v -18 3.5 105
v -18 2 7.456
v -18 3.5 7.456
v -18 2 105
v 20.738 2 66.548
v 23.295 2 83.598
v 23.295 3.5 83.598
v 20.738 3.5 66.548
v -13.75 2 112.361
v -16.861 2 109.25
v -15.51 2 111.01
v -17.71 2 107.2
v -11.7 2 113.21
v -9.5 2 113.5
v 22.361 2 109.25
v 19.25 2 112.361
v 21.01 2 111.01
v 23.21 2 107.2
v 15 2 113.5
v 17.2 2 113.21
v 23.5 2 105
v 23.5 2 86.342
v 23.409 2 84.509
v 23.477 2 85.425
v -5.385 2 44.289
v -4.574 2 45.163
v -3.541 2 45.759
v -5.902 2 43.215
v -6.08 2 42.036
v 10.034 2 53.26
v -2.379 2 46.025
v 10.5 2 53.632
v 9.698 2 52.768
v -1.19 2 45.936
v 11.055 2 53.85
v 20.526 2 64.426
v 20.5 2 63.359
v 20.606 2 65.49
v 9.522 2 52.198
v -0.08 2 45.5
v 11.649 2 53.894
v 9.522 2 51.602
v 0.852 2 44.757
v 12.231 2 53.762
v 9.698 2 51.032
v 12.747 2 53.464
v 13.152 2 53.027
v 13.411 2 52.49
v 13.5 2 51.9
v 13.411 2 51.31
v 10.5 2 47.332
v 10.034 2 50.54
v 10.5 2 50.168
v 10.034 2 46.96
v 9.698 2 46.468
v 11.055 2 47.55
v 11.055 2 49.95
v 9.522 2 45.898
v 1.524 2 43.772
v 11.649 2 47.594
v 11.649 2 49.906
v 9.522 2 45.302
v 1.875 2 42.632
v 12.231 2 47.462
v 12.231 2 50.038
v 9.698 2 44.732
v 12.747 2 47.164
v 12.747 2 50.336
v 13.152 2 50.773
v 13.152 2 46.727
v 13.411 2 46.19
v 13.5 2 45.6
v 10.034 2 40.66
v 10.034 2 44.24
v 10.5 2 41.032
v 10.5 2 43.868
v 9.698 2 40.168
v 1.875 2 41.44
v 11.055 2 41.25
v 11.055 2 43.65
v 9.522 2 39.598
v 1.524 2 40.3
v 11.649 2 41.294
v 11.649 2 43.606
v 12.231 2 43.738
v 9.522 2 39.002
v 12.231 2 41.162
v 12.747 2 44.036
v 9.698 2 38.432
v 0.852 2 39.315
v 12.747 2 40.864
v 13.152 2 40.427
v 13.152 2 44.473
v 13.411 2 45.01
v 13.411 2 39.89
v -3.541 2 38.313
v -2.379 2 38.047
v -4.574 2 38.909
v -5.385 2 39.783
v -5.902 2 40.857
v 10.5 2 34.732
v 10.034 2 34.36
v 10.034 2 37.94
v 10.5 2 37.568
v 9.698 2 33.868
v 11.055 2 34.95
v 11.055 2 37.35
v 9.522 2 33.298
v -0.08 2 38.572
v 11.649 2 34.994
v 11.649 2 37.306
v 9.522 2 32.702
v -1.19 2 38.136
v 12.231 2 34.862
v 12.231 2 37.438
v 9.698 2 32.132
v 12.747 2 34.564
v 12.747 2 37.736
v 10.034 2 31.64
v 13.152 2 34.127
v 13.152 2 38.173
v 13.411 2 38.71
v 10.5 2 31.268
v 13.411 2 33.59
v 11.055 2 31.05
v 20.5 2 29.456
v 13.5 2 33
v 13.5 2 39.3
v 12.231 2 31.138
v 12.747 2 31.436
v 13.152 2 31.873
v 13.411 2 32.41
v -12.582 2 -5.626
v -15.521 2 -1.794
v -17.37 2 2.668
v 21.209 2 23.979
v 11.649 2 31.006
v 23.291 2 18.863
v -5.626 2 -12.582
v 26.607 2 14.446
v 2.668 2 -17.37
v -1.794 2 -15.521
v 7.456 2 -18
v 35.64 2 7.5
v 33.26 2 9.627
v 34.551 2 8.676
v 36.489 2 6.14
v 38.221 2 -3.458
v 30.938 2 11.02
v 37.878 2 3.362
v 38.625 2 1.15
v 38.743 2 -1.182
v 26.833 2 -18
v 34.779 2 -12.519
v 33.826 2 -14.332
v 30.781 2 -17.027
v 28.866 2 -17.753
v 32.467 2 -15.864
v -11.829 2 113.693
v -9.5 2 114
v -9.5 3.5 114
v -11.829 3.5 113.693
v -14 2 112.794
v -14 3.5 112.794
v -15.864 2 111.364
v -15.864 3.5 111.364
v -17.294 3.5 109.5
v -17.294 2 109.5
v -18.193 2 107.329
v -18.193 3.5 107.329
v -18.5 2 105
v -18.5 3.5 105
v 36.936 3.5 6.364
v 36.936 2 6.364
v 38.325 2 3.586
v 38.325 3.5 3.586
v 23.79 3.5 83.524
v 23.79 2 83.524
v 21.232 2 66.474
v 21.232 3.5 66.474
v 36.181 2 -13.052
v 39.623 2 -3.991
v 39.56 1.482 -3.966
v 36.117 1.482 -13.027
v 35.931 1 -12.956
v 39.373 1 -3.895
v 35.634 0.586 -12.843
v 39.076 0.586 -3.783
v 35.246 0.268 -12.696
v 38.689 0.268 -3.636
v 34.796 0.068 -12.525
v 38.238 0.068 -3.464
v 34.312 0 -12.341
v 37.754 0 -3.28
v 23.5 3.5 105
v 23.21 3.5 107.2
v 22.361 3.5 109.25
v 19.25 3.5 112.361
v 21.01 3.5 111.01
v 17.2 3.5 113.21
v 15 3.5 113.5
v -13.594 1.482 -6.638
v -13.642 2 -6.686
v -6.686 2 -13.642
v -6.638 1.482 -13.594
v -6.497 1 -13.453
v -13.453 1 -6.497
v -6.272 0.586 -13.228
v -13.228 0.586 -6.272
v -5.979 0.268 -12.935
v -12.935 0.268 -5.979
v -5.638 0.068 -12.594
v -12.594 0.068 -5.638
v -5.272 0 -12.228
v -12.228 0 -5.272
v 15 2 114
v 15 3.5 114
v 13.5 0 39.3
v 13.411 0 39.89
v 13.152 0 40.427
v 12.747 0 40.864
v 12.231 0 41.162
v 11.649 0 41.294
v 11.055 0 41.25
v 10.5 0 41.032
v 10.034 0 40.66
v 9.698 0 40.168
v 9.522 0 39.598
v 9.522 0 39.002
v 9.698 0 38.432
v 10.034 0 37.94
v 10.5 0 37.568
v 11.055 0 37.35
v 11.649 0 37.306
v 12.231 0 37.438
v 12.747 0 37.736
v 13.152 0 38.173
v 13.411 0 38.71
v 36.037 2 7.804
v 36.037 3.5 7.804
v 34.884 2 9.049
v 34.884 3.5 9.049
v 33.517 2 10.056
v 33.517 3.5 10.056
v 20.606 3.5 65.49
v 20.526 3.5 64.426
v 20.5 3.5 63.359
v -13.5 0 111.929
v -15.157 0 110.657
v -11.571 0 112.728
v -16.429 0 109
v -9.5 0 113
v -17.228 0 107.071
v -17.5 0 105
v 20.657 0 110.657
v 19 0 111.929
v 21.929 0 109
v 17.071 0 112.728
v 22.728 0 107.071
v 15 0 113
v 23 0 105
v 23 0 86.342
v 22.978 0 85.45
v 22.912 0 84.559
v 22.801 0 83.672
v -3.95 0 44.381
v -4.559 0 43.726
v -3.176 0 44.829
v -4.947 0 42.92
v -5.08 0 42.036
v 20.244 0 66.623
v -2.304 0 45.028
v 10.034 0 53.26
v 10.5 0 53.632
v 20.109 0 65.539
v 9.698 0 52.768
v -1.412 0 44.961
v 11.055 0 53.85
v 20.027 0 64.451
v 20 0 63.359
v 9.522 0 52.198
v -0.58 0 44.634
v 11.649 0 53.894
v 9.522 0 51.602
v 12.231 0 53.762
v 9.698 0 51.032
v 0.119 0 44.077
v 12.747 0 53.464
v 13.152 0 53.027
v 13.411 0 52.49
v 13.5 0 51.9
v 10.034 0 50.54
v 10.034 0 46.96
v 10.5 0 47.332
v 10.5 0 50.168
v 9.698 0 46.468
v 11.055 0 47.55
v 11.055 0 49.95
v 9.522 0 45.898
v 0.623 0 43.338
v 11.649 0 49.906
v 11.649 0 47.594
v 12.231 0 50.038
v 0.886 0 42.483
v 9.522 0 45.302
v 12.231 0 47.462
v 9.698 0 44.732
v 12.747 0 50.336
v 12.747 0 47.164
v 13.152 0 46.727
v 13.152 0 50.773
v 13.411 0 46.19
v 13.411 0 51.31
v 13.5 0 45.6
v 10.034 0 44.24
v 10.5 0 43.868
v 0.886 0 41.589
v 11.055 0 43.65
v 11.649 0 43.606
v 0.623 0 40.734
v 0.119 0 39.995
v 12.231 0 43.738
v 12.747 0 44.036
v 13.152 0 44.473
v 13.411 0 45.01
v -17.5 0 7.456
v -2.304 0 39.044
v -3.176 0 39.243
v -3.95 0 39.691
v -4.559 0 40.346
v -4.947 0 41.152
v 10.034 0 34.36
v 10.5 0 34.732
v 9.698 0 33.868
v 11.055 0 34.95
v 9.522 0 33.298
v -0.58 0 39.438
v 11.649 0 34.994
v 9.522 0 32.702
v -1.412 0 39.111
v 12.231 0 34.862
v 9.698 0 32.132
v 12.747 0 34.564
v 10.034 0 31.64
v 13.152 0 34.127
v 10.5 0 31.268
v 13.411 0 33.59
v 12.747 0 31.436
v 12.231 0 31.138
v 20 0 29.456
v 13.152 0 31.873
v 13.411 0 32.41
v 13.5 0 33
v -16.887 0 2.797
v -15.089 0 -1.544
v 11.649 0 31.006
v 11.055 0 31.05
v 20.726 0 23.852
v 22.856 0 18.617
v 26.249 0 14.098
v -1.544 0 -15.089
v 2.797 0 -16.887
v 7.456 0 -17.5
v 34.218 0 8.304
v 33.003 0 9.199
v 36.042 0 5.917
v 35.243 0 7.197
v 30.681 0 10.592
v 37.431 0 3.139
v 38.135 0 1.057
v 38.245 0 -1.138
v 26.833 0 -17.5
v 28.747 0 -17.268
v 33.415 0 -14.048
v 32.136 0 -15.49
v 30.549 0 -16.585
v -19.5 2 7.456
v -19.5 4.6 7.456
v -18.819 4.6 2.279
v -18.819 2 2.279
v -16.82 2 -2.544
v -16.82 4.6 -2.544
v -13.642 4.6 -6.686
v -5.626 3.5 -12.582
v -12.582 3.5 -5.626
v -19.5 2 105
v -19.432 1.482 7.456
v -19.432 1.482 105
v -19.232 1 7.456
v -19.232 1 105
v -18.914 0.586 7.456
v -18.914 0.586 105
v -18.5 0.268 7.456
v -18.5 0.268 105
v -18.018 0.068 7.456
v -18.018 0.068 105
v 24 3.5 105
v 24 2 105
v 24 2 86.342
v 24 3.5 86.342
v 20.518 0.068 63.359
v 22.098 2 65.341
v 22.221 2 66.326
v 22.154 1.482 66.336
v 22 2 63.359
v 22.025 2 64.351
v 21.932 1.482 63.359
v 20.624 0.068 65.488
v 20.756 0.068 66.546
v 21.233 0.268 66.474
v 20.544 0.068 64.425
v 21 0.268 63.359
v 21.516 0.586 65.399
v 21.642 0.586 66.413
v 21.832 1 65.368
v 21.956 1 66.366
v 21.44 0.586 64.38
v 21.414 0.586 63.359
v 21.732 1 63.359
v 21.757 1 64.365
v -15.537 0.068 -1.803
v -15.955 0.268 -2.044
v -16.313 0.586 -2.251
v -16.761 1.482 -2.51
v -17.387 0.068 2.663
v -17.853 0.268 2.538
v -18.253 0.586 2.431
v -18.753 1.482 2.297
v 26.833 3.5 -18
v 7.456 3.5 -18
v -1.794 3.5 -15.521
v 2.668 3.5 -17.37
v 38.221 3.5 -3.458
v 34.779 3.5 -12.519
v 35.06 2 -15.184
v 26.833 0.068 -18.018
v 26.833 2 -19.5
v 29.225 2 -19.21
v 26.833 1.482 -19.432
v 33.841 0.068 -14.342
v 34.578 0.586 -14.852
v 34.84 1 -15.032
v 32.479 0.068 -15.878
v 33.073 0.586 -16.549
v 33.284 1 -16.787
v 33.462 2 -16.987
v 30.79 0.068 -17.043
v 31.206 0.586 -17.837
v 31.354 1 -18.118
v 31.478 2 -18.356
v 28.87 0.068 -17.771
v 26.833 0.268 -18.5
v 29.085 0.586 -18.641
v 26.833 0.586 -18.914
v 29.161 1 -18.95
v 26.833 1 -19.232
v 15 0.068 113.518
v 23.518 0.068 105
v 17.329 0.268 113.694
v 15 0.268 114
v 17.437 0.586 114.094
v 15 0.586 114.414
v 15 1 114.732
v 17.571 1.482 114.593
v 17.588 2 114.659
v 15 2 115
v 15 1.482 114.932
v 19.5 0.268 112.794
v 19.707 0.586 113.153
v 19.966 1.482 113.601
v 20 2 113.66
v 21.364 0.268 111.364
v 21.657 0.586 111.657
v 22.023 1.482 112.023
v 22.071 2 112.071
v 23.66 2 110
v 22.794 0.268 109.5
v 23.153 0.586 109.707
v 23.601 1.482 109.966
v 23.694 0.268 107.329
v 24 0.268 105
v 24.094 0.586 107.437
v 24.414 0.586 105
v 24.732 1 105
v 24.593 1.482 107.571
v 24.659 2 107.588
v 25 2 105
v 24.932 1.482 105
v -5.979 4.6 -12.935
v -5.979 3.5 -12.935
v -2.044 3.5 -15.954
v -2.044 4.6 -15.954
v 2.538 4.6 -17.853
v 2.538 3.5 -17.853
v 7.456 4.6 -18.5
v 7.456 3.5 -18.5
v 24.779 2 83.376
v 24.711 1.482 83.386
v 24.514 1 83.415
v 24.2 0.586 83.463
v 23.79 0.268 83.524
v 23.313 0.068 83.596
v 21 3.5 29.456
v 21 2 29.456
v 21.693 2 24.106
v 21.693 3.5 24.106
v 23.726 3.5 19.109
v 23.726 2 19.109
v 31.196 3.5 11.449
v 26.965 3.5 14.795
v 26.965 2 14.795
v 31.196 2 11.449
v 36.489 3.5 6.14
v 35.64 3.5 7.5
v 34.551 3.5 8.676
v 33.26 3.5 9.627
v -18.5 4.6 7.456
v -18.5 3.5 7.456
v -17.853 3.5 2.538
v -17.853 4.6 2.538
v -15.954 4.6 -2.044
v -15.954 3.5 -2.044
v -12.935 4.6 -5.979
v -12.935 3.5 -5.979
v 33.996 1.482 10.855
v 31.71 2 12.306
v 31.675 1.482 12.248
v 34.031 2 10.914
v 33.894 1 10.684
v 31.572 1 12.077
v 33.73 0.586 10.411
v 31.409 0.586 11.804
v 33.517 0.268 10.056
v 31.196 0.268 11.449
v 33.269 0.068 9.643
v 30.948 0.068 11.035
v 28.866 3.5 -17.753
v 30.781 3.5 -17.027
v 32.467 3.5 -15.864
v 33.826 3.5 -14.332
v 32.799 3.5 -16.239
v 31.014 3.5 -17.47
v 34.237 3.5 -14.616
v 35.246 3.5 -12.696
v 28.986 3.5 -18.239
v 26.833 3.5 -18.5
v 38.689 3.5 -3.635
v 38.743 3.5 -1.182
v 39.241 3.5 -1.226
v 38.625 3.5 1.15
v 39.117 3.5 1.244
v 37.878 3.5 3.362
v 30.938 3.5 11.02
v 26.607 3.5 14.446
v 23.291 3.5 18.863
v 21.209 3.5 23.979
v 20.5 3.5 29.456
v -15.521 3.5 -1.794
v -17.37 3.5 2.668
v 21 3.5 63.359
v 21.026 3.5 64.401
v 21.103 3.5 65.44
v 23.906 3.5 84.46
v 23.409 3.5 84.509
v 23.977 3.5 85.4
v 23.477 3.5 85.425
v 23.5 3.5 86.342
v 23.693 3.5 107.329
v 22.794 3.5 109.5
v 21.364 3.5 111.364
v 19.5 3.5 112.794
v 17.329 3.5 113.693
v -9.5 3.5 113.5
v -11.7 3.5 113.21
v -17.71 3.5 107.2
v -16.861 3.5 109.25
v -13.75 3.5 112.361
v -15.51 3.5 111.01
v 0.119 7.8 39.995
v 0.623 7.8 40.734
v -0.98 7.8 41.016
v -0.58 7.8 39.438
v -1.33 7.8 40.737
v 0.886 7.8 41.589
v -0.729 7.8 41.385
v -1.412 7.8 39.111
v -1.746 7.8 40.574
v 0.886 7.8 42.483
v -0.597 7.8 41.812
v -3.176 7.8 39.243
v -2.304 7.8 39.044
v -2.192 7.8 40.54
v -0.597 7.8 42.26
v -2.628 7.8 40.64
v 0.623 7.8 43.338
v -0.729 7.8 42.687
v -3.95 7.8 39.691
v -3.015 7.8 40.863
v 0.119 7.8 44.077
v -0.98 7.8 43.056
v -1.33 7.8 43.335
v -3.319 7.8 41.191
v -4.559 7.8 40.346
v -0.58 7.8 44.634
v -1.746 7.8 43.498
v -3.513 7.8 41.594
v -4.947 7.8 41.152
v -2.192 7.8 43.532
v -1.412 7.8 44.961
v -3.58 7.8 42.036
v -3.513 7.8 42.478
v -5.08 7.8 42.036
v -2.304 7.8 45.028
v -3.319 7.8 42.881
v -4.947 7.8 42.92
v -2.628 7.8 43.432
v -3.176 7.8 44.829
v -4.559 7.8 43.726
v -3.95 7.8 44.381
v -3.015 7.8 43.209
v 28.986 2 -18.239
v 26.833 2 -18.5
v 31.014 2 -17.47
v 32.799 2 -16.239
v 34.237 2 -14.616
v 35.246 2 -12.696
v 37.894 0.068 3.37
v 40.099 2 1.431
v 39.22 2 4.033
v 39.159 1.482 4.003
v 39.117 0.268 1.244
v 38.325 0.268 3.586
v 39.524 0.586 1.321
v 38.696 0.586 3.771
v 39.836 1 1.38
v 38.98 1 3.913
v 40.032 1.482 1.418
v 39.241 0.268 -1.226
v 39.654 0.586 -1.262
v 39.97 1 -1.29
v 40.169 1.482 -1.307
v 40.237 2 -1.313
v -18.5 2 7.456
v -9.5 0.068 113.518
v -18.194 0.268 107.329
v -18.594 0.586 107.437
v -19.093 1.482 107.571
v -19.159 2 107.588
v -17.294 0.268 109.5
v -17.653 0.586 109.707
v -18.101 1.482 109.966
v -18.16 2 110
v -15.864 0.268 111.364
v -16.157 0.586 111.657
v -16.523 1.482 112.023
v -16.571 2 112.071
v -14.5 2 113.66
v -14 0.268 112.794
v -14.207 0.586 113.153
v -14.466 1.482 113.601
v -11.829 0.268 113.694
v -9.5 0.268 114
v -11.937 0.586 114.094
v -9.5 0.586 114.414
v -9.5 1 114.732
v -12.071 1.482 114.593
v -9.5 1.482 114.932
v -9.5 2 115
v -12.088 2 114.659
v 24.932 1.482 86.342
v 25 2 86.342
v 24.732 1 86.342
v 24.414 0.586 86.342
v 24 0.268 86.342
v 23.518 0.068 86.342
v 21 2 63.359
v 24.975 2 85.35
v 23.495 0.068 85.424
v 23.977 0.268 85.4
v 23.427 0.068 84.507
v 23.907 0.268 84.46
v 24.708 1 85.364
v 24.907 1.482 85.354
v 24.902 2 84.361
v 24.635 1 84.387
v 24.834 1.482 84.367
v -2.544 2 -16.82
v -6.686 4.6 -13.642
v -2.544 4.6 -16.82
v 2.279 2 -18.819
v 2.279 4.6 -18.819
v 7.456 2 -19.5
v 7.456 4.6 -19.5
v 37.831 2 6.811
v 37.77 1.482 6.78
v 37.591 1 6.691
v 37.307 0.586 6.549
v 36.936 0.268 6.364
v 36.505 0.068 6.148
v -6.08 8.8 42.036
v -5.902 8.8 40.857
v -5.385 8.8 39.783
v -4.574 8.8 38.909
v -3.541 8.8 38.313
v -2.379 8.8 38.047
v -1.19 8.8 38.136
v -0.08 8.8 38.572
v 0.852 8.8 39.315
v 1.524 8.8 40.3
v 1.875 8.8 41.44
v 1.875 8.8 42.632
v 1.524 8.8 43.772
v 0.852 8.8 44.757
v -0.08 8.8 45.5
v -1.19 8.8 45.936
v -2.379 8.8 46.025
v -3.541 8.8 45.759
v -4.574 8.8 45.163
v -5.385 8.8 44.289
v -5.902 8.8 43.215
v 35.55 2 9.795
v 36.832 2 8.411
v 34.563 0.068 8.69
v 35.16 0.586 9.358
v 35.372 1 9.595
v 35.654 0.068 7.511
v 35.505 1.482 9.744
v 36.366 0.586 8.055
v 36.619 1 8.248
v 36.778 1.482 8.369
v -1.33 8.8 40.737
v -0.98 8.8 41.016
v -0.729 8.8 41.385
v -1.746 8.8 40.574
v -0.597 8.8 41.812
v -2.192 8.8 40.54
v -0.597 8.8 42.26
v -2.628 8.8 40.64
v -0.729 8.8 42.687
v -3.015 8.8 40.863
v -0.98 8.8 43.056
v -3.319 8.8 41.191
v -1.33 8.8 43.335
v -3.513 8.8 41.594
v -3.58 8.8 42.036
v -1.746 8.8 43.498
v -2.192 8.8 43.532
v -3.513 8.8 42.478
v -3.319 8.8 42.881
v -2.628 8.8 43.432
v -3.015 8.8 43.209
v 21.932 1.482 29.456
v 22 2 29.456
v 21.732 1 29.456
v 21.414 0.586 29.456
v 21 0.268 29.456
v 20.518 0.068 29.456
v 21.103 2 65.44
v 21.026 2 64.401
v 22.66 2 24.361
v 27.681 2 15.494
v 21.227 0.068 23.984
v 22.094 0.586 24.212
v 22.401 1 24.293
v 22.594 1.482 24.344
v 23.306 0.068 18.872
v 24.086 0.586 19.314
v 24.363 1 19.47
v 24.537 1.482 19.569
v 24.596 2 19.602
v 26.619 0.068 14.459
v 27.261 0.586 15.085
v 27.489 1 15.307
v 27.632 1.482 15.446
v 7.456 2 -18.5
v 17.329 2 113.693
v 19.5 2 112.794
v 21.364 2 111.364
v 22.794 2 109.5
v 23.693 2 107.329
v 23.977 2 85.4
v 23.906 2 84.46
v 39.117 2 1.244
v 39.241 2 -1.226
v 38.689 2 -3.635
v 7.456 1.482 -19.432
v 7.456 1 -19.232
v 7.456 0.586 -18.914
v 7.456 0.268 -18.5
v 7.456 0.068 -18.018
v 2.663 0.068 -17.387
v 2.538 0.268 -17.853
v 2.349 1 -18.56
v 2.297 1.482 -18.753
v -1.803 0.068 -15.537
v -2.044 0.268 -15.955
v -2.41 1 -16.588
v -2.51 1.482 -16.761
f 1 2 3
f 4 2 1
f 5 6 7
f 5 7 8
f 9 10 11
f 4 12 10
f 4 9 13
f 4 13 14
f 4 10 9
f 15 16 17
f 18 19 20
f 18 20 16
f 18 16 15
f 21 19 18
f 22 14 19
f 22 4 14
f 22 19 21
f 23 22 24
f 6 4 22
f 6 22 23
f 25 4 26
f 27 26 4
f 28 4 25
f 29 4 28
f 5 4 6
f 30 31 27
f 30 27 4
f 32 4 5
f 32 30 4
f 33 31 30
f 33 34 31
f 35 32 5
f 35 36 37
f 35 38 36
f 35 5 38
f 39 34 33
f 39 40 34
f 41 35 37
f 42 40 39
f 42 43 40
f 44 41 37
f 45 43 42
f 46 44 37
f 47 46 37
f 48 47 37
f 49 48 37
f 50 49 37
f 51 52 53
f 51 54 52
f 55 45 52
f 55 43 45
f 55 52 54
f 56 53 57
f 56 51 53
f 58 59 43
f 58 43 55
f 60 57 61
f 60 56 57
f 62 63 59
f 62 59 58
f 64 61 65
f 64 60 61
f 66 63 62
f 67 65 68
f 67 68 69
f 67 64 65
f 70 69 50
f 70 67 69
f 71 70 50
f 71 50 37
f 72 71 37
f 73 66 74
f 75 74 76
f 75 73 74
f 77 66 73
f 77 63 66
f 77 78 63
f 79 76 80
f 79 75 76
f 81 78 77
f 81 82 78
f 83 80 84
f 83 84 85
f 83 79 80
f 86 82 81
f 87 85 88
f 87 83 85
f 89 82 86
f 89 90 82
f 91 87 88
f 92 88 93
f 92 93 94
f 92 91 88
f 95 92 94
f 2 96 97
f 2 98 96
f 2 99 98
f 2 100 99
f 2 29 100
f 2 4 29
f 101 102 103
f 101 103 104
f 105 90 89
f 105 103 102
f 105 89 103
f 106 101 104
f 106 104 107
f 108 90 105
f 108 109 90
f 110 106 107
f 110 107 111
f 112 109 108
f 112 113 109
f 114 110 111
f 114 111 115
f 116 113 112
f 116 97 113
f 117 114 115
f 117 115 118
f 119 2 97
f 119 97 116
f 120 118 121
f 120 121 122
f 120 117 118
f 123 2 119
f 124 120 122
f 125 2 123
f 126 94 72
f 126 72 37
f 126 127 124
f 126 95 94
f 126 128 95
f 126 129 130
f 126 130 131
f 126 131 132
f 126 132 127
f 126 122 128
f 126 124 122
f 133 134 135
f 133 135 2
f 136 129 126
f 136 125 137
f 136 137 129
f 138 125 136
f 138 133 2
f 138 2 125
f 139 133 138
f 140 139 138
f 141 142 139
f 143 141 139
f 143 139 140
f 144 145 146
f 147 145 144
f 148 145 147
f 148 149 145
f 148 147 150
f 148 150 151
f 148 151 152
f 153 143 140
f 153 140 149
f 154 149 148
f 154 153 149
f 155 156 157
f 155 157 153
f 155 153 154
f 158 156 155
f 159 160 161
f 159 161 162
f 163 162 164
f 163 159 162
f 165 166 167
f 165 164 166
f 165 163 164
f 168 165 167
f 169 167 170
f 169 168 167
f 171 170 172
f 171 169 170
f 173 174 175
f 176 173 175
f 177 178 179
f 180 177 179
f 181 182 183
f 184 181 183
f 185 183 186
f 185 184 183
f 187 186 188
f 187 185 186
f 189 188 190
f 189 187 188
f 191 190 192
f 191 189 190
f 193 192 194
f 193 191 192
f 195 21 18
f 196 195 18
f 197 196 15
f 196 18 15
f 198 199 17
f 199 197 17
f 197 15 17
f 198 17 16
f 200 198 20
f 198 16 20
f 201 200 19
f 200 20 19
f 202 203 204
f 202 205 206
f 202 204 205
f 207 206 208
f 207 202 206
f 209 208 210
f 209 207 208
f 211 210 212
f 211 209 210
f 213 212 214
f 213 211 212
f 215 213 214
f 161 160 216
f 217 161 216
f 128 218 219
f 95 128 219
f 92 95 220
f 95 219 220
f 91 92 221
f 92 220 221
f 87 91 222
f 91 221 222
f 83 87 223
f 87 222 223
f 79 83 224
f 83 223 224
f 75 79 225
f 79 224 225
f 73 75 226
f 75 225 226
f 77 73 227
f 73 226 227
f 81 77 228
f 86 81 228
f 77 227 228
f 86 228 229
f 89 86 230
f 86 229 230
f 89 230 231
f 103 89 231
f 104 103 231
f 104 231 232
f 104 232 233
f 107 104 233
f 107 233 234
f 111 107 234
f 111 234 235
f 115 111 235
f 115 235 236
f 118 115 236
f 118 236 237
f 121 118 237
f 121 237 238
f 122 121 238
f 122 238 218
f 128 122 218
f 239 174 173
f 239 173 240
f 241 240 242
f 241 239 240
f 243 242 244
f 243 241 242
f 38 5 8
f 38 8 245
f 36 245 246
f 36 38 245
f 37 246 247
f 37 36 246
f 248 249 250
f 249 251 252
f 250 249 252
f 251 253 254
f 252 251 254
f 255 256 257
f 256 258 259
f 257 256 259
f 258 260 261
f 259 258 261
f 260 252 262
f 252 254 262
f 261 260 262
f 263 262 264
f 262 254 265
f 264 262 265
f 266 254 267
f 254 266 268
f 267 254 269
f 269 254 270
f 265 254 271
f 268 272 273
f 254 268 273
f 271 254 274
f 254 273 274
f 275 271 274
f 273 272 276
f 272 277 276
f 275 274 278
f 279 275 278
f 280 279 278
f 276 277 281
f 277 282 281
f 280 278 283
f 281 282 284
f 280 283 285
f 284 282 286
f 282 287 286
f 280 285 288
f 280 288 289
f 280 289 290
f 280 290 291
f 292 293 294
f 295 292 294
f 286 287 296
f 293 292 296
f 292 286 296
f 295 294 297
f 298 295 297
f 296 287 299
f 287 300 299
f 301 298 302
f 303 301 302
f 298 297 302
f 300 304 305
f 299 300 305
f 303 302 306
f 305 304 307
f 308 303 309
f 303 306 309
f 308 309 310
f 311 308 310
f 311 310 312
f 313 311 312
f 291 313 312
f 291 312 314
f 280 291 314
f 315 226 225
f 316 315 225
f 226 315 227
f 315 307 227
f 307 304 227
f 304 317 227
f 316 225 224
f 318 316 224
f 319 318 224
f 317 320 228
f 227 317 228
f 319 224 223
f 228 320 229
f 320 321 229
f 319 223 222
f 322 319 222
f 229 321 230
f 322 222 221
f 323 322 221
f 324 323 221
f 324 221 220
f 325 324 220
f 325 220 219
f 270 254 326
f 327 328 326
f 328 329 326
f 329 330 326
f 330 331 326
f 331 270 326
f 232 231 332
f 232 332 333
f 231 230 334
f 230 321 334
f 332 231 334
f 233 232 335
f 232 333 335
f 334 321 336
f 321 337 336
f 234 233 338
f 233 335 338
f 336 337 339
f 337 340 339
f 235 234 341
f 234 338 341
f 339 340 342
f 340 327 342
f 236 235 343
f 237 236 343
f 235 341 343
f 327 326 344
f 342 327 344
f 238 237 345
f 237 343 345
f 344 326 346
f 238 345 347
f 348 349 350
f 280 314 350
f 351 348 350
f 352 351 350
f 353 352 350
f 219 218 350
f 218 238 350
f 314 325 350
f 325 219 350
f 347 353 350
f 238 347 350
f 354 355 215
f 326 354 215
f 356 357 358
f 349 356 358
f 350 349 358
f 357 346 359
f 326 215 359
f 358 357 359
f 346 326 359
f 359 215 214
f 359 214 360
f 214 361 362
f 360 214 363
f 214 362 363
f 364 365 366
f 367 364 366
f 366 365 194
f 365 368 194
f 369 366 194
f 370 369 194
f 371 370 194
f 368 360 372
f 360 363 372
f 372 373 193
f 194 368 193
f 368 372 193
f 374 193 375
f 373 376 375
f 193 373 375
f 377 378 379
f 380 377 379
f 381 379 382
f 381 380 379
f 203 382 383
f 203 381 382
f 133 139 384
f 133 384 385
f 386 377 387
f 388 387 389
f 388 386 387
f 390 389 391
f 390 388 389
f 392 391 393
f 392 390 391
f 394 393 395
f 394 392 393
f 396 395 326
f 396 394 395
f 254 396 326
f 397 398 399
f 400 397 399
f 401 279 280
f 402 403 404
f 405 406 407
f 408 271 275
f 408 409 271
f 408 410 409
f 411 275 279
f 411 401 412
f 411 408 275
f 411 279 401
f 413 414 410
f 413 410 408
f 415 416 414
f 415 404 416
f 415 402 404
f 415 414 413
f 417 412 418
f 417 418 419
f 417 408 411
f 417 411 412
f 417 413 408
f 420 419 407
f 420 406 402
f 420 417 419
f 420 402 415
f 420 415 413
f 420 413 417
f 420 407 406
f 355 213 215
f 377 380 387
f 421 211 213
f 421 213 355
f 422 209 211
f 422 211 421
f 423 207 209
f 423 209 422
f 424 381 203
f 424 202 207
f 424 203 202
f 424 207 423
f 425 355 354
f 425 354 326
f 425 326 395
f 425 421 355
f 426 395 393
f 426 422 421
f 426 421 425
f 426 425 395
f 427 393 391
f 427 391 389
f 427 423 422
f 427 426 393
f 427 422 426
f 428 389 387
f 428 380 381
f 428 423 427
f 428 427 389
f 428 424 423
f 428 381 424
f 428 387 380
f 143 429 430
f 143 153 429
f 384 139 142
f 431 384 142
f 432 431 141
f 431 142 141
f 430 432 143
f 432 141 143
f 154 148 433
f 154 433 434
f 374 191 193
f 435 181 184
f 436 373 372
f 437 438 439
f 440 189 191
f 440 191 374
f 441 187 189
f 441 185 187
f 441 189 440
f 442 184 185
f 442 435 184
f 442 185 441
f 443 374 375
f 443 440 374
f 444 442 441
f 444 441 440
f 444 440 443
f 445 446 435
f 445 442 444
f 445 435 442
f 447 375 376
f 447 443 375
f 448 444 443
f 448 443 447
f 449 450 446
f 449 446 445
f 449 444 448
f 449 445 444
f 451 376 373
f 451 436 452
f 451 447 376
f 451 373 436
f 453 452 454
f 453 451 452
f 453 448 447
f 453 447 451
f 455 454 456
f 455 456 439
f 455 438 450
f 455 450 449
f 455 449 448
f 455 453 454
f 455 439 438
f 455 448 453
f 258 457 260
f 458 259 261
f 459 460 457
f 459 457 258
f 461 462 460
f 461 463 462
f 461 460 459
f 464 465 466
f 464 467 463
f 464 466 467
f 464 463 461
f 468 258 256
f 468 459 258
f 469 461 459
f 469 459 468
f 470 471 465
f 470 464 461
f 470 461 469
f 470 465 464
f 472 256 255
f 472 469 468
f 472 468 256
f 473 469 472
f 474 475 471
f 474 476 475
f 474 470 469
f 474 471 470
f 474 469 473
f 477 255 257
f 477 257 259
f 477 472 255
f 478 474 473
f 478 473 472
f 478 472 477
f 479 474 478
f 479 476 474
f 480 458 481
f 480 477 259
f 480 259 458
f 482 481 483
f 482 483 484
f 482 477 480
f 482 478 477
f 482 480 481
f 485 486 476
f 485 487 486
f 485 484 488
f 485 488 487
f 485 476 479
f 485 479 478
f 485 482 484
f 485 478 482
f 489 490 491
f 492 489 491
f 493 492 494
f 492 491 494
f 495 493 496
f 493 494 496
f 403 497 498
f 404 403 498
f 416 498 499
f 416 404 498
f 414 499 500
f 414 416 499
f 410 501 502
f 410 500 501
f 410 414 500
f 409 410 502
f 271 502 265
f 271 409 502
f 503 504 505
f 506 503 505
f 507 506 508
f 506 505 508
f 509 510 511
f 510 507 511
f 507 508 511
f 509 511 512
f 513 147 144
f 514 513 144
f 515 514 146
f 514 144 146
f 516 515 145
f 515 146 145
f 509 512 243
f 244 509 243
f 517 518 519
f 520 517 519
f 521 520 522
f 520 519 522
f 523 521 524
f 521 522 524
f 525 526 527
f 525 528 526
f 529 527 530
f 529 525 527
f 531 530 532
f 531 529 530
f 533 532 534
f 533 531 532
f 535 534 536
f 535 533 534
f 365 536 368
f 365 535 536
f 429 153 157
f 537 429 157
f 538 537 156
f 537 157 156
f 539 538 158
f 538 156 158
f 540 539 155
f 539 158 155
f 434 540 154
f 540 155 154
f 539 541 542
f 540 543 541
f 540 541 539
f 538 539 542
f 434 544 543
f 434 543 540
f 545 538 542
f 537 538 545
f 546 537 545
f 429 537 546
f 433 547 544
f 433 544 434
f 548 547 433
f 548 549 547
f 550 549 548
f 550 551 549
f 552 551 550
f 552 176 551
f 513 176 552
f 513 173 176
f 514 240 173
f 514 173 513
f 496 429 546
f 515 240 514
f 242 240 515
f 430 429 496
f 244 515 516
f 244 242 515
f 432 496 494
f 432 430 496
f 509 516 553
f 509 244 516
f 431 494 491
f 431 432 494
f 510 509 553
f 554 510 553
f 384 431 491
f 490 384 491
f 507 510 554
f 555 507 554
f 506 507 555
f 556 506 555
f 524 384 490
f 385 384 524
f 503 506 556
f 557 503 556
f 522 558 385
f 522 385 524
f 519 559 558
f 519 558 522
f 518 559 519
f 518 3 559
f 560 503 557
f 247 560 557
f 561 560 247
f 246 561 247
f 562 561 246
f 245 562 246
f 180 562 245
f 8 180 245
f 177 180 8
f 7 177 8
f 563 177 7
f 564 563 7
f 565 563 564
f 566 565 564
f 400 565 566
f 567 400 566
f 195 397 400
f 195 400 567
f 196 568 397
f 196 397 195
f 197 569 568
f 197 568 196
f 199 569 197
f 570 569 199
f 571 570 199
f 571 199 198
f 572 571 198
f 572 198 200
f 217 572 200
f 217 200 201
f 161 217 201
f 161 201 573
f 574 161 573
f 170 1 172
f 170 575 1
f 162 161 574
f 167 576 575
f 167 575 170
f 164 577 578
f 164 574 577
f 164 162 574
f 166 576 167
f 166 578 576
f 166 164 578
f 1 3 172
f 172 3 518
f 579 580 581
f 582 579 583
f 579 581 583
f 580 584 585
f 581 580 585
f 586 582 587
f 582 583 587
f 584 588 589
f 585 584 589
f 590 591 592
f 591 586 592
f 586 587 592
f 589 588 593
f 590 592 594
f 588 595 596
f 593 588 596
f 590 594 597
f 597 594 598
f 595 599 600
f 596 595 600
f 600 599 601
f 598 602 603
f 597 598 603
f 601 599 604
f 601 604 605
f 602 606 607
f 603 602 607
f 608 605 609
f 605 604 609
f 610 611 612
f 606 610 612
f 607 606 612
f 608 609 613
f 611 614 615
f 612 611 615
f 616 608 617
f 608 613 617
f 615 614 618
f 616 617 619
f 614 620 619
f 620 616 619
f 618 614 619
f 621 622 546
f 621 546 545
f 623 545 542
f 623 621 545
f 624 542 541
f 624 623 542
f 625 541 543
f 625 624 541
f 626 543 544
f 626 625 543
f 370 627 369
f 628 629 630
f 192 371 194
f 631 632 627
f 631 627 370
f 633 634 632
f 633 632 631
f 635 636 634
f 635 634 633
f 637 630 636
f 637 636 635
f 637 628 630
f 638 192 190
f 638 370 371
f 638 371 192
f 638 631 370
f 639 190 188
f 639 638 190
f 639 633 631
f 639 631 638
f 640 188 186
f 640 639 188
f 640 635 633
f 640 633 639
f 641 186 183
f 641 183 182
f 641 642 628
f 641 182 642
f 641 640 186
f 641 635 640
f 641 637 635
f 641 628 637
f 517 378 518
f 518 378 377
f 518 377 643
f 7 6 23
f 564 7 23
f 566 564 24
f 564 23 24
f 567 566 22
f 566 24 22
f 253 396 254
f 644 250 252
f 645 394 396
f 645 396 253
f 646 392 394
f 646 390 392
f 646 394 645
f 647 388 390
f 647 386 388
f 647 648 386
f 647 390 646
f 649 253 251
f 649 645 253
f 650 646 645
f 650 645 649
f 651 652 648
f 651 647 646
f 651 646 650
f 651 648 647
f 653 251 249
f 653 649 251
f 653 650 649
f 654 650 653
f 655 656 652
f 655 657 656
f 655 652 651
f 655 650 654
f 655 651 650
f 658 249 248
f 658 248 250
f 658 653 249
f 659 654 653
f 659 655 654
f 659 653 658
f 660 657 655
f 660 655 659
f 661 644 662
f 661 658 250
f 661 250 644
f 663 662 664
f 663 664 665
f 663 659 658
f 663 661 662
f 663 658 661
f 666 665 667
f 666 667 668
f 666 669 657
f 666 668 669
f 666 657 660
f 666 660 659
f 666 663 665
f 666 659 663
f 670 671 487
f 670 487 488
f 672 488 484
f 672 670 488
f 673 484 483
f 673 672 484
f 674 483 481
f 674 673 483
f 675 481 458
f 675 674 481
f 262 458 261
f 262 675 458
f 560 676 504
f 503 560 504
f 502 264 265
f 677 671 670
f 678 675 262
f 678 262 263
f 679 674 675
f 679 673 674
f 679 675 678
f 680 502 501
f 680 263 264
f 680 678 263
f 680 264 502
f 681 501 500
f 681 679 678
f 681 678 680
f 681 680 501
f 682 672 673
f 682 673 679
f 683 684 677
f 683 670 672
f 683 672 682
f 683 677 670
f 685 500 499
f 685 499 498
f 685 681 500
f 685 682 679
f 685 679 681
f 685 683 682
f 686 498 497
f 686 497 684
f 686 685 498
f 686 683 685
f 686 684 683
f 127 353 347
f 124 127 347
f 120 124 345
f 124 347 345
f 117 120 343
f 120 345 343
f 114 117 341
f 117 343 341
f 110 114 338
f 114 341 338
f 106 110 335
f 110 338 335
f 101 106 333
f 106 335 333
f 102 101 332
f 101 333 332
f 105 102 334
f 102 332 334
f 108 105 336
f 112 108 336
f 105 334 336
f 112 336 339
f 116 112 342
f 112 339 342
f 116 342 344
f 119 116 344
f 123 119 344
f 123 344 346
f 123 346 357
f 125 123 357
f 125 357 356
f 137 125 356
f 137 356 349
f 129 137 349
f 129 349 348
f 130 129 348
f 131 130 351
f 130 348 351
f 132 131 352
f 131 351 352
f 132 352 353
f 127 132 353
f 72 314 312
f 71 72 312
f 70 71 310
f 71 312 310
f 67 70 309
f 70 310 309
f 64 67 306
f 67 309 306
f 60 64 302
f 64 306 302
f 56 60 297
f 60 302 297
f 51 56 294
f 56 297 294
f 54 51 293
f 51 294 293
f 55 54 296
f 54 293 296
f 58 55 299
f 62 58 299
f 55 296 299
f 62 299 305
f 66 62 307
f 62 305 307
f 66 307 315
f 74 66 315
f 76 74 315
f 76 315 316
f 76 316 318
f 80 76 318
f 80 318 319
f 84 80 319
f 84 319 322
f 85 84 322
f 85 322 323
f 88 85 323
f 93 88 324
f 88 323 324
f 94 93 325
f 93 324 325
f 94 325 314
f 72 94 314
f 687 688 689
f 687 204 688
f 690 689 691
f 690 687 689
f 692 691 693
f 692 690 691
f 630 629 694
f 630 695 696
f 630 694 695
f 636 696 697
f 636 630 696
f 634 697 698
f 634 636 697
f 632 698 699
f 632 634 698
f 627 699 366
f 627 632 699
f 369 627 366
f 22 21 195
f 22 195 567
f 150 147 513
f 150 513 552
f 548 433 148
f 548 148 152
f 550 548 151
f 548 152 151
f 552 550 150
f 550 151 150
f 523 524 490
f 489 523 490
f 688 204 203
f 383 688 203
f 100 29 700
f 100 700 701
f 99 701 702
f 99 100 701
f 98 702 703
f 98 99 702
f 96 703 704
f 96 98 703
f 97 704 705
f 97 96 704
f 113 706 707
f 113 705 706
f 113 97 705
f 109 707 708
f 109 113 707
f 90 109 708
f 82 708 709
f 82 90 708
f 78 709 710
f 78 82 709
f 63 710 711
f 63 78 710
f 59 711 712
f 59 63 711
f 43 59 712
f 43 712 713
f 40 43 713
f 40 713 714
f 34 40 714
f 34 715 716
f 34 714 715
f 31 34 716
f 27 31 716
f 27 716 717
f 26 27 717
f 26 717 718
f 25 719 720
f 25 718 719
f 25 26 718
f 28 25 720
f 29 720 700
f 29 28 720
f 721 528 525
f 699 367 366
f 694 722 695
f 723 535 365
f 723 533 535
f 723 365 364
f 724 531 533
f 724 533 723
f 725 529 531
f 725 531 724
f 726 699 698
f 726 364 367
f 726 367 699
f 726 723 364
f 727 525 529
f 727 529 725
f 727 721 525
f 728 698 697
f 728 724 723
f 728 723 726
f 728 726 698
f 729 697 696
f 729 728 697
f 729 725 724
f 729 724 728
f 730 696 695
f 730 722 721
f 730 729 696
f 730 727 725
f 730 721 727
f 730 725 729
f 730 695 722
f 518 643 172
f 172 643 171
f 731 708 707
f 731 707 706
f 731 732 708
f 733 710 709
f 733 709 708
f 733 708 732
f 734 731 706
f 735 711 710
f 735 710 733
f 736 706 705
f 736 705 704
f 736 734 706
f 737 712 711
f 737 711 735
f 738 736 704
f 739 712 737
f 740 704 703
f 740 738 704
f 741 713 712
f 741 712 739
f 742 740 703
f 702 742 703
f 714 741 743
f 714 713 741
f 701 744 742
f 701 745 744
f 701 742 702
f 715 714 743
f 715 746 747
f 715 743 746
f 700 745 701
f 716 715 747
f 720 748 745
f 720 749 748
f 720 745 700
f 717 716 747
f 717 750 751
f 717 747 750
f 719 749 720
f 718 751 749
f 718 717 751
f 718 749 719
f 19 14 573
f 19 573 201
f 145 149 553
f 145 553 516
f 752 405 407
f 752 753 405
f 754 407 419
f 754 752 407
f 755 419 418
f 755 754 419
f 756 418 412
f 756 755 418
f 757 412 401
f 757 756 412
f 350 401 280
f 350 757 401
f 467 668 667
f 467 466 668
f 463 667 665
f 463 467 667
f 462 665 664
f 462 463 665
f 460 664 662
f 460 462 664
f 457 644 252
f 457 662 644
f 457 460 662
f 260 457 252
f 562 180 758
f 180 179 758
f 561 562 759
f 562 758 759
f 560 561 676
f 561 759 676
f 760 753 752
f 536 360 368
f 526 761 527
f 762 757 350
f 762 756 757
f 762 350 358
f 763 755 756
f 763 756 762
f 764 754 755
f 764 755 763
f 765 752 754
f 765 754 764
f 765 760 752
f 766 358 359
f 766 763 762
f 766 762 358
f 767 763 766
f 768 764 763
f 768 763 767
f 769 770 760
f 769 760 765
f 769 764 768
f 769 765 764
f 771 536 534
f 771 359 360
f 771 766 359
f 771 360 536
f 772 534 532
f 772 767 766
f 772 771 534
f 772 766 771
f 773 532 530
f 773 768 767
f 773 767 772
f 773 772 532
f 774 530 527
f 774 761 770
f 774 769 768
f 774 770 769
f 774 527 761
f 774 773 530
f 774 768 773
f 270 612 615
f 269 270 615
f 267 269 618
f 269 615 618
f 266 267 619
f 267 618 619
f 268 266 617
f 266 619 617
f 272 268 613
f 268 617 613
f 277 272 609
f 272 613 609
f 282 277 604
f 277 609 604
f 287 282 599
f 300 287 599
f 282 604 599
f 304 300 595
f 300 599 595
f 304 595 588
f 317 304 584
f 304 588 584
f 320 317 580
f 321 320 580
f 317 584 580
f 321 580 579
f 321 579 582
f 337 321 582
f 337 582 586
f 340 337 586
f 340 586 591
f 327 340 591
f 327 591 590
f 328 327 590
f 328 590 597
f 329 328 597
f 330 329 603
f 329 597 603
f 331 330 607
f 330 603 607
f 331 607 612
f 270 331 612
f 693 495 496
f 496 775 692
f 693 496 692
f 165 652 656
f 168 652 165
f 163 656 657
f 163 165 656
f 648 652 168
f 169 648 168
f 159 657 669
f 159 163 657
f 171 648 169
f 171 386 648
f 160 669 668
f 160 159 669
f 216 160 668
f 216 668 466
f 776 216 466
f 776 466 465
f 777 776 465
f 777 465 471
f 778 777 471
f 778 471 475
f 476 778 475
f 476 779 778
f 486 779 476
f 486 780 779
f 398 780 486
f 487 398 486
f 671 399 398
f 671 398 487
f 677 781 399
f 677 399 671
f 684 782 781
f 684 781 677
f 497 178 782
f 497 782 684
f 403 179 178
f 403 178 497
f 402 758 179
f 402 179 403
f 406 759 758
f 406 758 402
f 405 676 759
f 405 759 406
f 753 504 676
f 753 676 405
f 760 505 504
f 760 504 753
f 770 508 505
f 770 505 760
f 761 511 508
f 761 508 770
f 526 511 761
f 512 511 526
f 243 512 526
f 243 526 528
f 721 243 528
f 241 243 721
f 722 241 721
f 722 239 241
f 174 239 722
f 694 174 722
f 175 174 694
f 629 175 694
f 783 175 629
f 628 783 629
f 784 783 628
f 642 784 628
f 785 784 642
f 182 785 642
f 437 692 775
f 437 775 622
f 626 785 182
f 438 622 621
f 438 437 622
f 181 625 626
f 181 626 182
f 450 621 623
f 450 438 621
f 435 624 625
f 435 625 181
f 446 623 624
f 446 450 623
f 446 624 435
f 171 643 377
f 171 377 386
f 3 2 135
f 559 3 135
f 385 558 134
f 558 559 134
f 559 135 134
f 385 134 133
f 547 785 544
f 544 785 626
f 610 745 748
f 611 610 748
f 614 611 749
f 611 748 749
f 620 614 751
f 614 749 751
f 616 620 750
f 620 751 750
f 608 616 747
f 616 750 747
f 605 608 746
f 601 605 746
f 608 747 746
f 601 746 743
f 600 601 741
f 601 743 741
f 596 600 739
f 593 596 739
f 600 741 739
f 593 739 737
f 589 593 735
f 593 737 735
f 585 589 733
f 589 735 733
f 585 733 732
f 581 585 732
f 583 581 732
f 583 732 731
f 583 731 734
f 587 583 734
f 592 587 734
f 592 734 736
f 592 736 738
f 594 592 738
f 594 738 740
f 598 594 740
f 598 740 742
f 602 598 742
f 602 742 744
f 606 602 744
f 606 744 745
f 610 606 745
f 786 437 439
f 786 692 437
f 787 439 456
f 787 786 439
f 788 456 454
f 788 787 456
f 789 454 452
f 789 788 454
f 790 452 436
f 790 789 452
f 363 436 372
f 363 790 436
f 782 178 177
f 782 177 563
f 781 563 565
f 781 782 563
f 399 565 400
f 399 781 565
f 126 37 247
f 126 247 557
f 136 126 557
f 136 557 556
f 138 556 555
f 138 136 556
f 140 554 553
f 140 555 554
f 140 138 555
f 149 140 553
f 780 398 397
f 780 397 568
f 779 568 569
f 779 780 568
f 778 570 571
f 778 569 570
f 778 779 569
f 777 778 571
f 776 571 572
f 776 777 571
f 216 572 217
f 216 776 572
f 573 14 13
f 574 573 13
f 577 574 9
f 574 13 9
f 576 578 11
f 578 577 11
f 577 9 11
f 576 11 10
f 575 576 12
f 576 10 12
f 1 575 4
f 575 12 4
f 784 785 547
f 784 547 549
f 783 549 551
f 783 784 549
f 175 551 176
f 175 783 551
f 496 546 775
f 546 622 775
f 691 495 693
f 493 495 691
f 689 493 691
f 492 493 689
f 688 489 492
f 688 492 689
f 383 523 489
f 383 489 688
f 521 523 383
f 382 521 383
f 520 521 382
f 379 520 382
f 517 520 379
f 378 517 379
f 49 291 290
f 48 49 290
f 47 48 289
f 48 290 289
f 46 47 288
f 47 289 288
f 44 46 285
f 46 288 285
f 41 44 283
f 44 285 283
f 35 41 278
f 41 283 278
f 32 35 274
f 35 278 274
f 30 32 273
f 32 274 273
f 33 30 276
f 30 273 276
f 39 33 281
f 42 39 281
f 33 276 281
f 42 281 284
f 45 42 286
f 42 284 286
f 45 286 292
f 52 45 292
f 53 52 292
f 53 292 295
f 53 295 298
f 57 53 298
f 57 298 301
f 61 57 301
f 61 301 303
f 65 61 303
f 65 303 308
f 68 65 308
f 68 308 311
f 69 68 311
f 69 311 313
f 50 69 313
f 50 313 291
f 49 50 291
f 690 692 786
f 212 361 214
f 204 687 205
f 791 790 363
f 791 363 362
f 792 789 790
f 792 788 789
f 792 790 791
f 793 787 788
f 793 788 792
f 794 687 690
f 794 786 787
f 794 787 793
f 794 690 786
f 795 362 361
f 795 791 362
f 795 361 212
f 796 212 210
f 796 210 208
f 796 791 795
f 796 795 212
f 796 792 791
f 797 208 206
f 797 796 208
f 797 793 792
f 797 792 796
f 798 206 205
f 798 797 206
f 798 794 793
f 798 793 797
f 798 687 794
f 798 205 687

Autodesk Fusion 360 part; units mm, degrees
sketch "Sketch1" plane through (0, 0, 0) normal (0, 1, 0) x (1, 0, 0)
  line L0 (31.7101, -12.3063) -> (34.0314, -10.9136)
  arc A0 (39.2196, -4.033) -> (39.6234, 3.9906) centre (30.2753, 0.4391) ccw
  line L1 (37.8307, -6.8108) -> (39.2196, -4.033)
  arc A1 (15, -115) -> (25, -105) centre (15, -105) ccw
  arc A2 (31.7101, -12.3063) -> (22, -29.4562) centre (42, -29.4562) ccw
  arc A3 (34.0314, -10.9136) -> (37.8307, -6.8108) centre (28.8864, -2.3386) ccw
  arc A4 (36.181, 13.0515) -> (26.8329, 19.5) centre (26.8329, 9.5) ccw
  line L2 (39.6234, 3.9906) -> (36.181, 13.0515)
  arc A5 (-13.6421, 6.6863) -> (-19.5, -7.4558) centre (0.5, -7.4558) ccw
  line L3 (22, -63.3592) -> (22, -29.4562)
  arc A6 (7.4558, 19.5) -> (-6.6863, 13.6421) centre (7.4558, -0.5) ccw
  line L4 (24.7787, -83.3757) -> (22.2213, -66.326)
  arc A7 (25, -86.3425) -> (24.7787, -83.3757) centre (5, -86.3425) ccw
  line L5 (-6.6863, 13.6421) -> (-13.6421, 6.6863)
  line L6 (-9.5, -115) -> (15, -115)
  arc A8 (-19.5, -105) -> (-9.5, -115) centre (-9.5, -105) ccw
  line L7 (25, -105) -> (25, -86.3425)
  line L8 (26.8329, 19.5) -> (7.4558, 19.5)
  line L9 (-19.5, -7.4558) -> (-19.5, -105)
  arc A9 (22, -63.3592) -> (22.2213, -66.326) centre (42, -63.3592) ccw
extrude "Extrude1" add sketch "Sketch1" along normal blind 2
sketch "Sketch2" plane through (0, 2, 0) normal (0, 1, 0) x (-1, 0, 0)
  line L0 (-31.7101, 12.3063) -> (-34.0314, 10.9136)
  arc A0 (-34.0314, 10.9136) -> (-37.8307, 6.8108) centre (-28.8864, 2.3386) ccw
  line L1 (-37.8307, 6.8108) -> (-39.2196, 4.033)
  arc A1 (-39.2196, 4.033) -> (-39.6234, -3.9906) centre (-30.2753, -0.4391) ccw
  line L2 (-39.6234, -3.9906) -> (-36.181, -13.0515)
  arc A2 (-36.181, -13.0515) -> (-26.8329, -19.5) centre (-26.8329, -9.5) ccw
  line L3 (-26.8329, -19.5) -> (-7.4558, -19.5)
  arc A3 (-7.4558, -19.5) -> (6.6863, -13.6421) centre (-7.4558, 0.5) ccw
  line L4 (6.6863, -13.6421) -> (13.6421, -6.6863)
  arc A4 (13.6421, -6.6863) -> (19.5, 7.4558) centre (-0.5, 7.4558) ccw
  line L5 (19.5, 7.4558) -> (19.5, 105)
  arc A5 (19.5, 105) -> (9.5, 115) centre (9.5, 105) ccw
  line L6 (9.5, 115) -> (-15, 115)
  arc A6 (-15, 115) -> (-25, 105) centre (-15, 105) ccw
  line L7 (-25, 105) -> (-25, 86.3425)
  arc A7 (-25, 86.3425) -> (-24.7787, 83.3757) centre (-5, 86.3425) ccw
  line L8 (-24.7787, 83.3757) -> (-22.2213, 66.326)
  arc A8 (-22, 63.3592) -> (-22.2213, 66.326) centre (-42, 63.3592) ccw
  line L9 (-22, 63.3592) -> (-22, 29.4562)
  arc A9 (-31.7101, 12.3063) -> (-22, 29.4562) centre (-42, 29.4562) ccw
  line L10 (18.5, 7.4558) -> (18.5, 105)
  arc A10 (18.5, 105) -> (9.5, 114) centre (9.5, 105) ccw
  line L11 (9.5, 114) -> (-15, 114)
  arc A11 (-15, 114) -> (-24, 105) centre (-15, 105) ccw
  line L12 (-24, 105) -> (-24, 86.3425)
  arc A12 (-24, 86.3425) -> (-23.7898, 83.524) centre (-5, 86.3425) ccw
  line L13 (-23.7898, 83.524) -> (-21.2323, 66.4743)
  arc A13 (-21, 63.3592) -> (-21.2323, 66.4743) centre (-42, 63.3592) ccw
  line L14 (-21, 63.3592) -> (-21, 29.4562)
  arc A14 (-31.1956, 11.4488) -> (-21, 29.4562) centre (-42, 29.4562) ccw
  line L15 (-31.1956, 11.4488) -> (-33.5169, 10.0561)
  arc A15 (-33.5169, 10.0561) -> (-36.9363, 6.3636) centre (-28.8864, 2.3386) ccw
  line L16 (-36.9363, 6.3636) -> (-38.3251, 3.5858)
  arc A16 (-38.3251, 3.5858) -> (-38.6886, -3.6354) centre (-30.2753, -0.4391) ccw
  line L17 (-38.6886, -3.6354) -> (-35.2462, -12.6963)
  arc A17 (-35.2462, -12.6963) -> (-26.8329, -18.5) centre (-26.8329, -9.5) ccw
  line L18 (-26.8329, -18.5) -> (-7.4558, -18.5)
  arc A18 (-7.4558, -18.5) -> (5.9792, -12.935) centre (-7.4558, 0.5) ccw
  line L19 (5.9792, -12.935) -> (12.935, -5.9792)
  arc A19 (12.935, -5.9792) -> (18.5, 7.4558) centre (-0.5, 7.4558) ccw
  line L20 (9.5, 113.5) -> (-15, 113.5)
  arc A20 (-15, 113.5) -> (-23.5, 105) centre (-15, 105) ccw
  line L21 (-23.5, 105) -> (-23.5, 86.3425)
  arc A21 (-23.5, 86.3425) -> (-23.2953, 83.5982) centre (-5, 86.3425) ccw
  line L22 (-23.2953, 83.5982) -> (-20.7379, 66.5485)
  arc A22 (-20.5, 63.3592) -> (-20.7379, 66.5485) centre (-42, 63.3592) ccw
  line L23 (-20.5, 63.3592) -> (-20.5, 29.4562)
  arc A23 (-30.9383, 11.0201) -> (-20.5, 29.4562) centre (-42, 29.4562) ccw
  line L24 (-30.9383, 11.0201) -> (-33.2596, 9.6273)
  arc A24 (-33.2596, 9.6273) -> (-36.489, 6.1399) centre (-28.8864, 2.3386) ccw
  line L25 (-36.489, 6.1399) -> (-37.8779, 3.3622)
  arc A25 (-37.8779, 3.3622) -> (-38.2212, -3.4579) centre (-30.2753, -0.4391) ccw
  line L26 (-38.2212, -3.4579) -> (-34.7788, -12.5188)
  arc A26 (-34.7788, -12.5188) -> (-26.8329, -18) centre (-26.8329, -9.5) ccw
  line L27 (-26.8329, -18) -> (-7.4558, -18)
  arc A27 (-7.4558, -18) -> (5.6256, -12.5815) centre (-7.4558, 0.5) ccw
  line L28 (5.6256, -12.5815) -> (12.5815, -5.6256)
  arc A28 (12.5815, -5.6256) -> (18, 7.4558) centre (-0.5, 7.4558) ccw
  line L29 (18, 7.4558) -> (18, 105)
  arc A29 (18, 105) -> (9.5, 113.5) centre (9.5, 105) ccw
  dimension "d40" = -1
  dimension "d41" = -1.5
extrude "Extrude2" add sketch "Sketch2" along normal blind 1.5 contours L10 A10 L11 A11 L12 A12 L13 A13 L14 A14 L15 A15 L16 A16 L17 A17 L18 A18 L19 A19
sketch "Sketch3" plane through (0, 2, 0) normal (0, 1, 0) x (-1, 0, 0)
  line L0 (19.5, 7.4558) -> (18.5, 7.4558)
  arc A0 (-31.7101, 12.3063) -> (-22, 29.4562) centre (-42, 29.4562) ccw
  line L1 (-31.7101, 12.3063) -> (-34.0314, 10.9136)
  arc A1 (-34.0314, 10.9136) -> (-37.8307, 6.8108) centre (-28.8864, 2.3386) ccw
  line L2 (-37.8307, 6.8108) -> (-39.2196, 4.033)
  line L3 (-25, 105) -> (-25, 86.3425)
  arc A2 (-25, 86.3425) -> (-24.7787, 83.3757) centre (-5, 86.3425) ccw
  line L4 (-24.7787, 83.3757) -> (-22.2213, 66.326)
  arc A3 (-22, 63.3592) -> (-22.2213, 66.326) centre (-42, 63.3592) ccw
  line L5 (-22, 63.3592) -> (-22, 29.4562)
  line L6 (-39.6234, -3.9906) -> (-36.181, -13.0515)
  arc A4 (-36.181, -13.0515) -> (-26.8329, -19.5) centre (-26.8329, -9.5) ccw
  line L7 (-26.8329, -19.5) -> (-7.4558, -19.5)
  arc A5 (-7.4558, -19.5) -> (6.6863, -13.6421) centre (-7.4558, 0.5) ccw
  line L8 (6.6863, -13.6421) -> (13.6421, -6.6863)
  arc A6 (13.6421, -6.6863) -> (19.5, 7.4558) centre (-0.5, 7.4558) ccw
  line L9 (19.5, 7.4558) -> (19.5, 105)
  arc A7 (19.5, 105) -> (9.5, 115) centre (9.5, 105) ccw
  line L10 (9.5, 115) -> (-15, 115)
  arc A8 (-15, 115) -> (-25, 105) centre (-15, 105) ccw
  arc A9 (-33.2596, 9.6273) -> (-36.489, 6.1399) centre (-28.8864, 2.3386) ccw
  line L11 (-36.489, 6.1399) -> (-37.8779, 3.3622)
  arc A10 (-37.8779, 3.3622) -> (-38.2212, -3.4579) centre (-30.2753, -0.4391) ccw
  line L12 (-38.2212, -3.4579) -> (-34.7788, -12.5188)
  arc A11 (-34.7788, -12.5188) -> (-26.8329, -18) centre (-26.8329, -9.5) ccw
  line L13 (-26.8329, -18) -> (-7.4558, -18)
  arc A12 (-7.4558, -18) -> (5.6256, -12.5815) centre (-7.4558, 0.5) ccw
  line L14 (5.6256, -12.5815) -> (12.5815, -5.6256)
  arc A13 (12.5815, -5.6256) -> (18, 7.4558) centre (-0.5, 7.4558) ccw
  line L15 (18, 7.4558) -> (18, 105)
  arc A14 (18, 105) -> (9.5, 113.5) centre (9.5, 105) ccw
  line L16 (9.5, 113.5) -> (-15, 113.5)
  arc A15 (-15, 113.5) -> (-23.5, 105) centre (-15, 105) ccw
  line L17 (-23.5, 105) -> (-23.5, 86.3425)
  arc A16 (-23.5, 86.3425) -> (-23.2953, 83.5982) centre (-5, 86.3425) ccw
  line L18 (-23.2953, 83.5982) -> (-20.7379, 66.5485)
  arc A17 (-20.5, 63.3592) -> (-20.7379, 66.5485) centre (-42, 63.3592) ccw
  line L19 (-20.5, 63.3592) -> (-20.5, 29.4562)
  arc A18 (-30.9383, 11.0201) -> (-20.5, 29.4562) centre (-42, 29.4562) ccw
  line L20 (-30.9383, 11.0201) -> (-33.2596, 9.6273)
  arc A19 (-39.2196, 4.033) -> (-39.6234, -3.9906) centre (-30.2753, -0.4391) ccw
  arc A20 (-31.1956, 11.4488) -> (-21, 29.4562) centre (-42, 29.4562) ccw
  line L21 (-21, 29.4562) -> (-21, 63.3592)
  arc A21 (-21, 63.3592) -> (-21.2323, 66.4743) centre (-42, 63.3592) ccw
  line L22 (-21.2323, 66.4743) -> (-23.7898, 83.524)
  arc A22 (-24, 86.3425) -> (-23.7898, 83.524) centre (-5, 86.3425) ccw
  line L23 (-24, 86.3425) -> (-24, 105)
  arc A23 (-15, 114) -> (-24, 105) centre (-15, 105) ccw
  line L24 (-15, 114) -> (9.5, 114)
  arc A24 (18.5, 105) -> (9.5, 114) centre (9.5, 105) ccw
  line L25 (18.5, 105) -> (18.5, 7.4558)
  arc A25 (12.935, -5.9792) -> (18.5, 7.4558) centre (-0.5, 7.4558) ccw
  line L26 (12.935, -5.9792) -> (5.9792, -12.935)
  arc A26 (-7.4558, -18.5) -> (5.9792, -12.935) centre (-7.4558, 0.5) ccw
  line L27 (-7.4558, -18.5) -> (-26.8329, -18.5)
  arc A27 (-35.2462, -12.6963) -> (-26.8329, -18.5) centre (-26.8329, -9.5) ccw
  line L28 (-35.2462, -12.6963) -> (-38.6886, -3.6354)
  arc A28 (-38.3251, 3.5858) -> (-38.6886, -3.6354) centre (-30.2753, -0.4391) ccw
  line L29 (-38.3251, 3.5858) -> (-36.9363, 6.3636)
  arc A29 (-33.5169, 10.0561) -> (-36.9363, 6.3636) centre (-28.8864, 2.3386) ccw
  line L30 (-33.5169, 10.0561) -> (-31.1956, 11.4488)
  line L31 (-7.4558, -18.5) -> (-7.4558, -19.5)
extrude "Extrude3" add sketch "Sketch3" along normal blind 2.6 contours L0 A5 L8 A6 A25 L26 A26 L31
sketch "Sketch4" plane through (0, 0, 0) normal (0, -1, 0) x (1, 0, 0)
  circle A0 centre (11.5, 33) radius 2
  circle A1 centre (11.5, 39.3) radius 2
  circle A2 centre (11.5, 45.6) radius 2
  circle A3 centre (11.5, 51.9) radius 2
  line L0 (34.0314, 10.9136) -> (31.7101, 12.3063)
  arc A4 (22, 29.4562) -> (31.7101, 12.3063) centre (42, 29.4562) ccw
  line L1 (22, 29.4562) -> (22, 63.3592)
  arc A5 (22.2213, 66.326) -> (22, 63.3592) centre (42, 63.3592) ccw
  line L2 (22.2213, 66.326) -> (24.7787, 83.3757)
  arc A6 (24.7787, 83.3757) -> (25, 86.3425) centre (5, 86.3425) ccw
  line L3 (25, 86.3425) -> (25, 105)
  arc A7 (25, 105) -> (15, 115) centre (15, 105) ccw
  line L4 (15, 115) -> (-9.5, 115)
  arc A8 (-9.5, 115) -> (-19.5, 105) centre (-9.5, 105) ccw
  line L5 (-19.5, 105) -> (-19.5, 7.4558)
  arc A9 (-19.5, 7.4558) -> (-13.6421, -6.6863) centre (0.5, 7.4558) ccw
  line L6 (-13.6421, -6.6863) -> (-6.6863, -13.6421)
  arc A10 (-6.6863, -13.6421) -> (7.4558, -19.5) centre (7.4558, 0.5) ccw
  line L7 (7.4558, -19.5) -> (26.8329, -19.5)
  arc A11 (26.8329, -19.5) -> (36.181, -13.0515) centre (26.8329, -9.5) ccw
  line L8 (36.181, -13.0515) -> (39.6234, -3.9906)
  arc A12 (39.6234, -3.9906) -> (39.2196, 4.033) centre (30.2753, -0.4391) ccw
  line L9 (39.2196, 4.033) -> (37.8307, 6.8108)
  arc A13 (37.8307, 6.8108) -> (34.0314, 10.9136) centre (28.8864, 2.3386) ccw
  dimension "d14" = 4
  dimension "d18" = 0
  dimension "d19" = 6.3
  dimension "d44" = 10.5
extrude "Extrude4" cut sketch "Sketch4" against normal blind 5 contours A0 | A1 | A2 | A3
sketch "Sketch5" plane through (0, 2, 0) normal (0, 1, 0) x (-1, 0, 0)
  circle A0 centre (-11.5, 39.3) radius 2
  circle A1 centre (-11.5, 45.6) radius 2
  circle A2 centre (-11.5, 33) radius 2
  circle A3 centre (-11.5, 51.9) radius 2
  circle A4 centre (2.08, 42.036) radius 3
  circle A5 centre (2.08, 42.036) radius 4
  arc A6 (-33.2596, 9.6273) -> (-36.489, 6.1399) centre (-28.8864, 2.3386) ccw
  line L0 (-36.489, 6.1399) -> (-37.8779, 3.3622)
  arc A7 (-37.8779, 3.3622) -> (-38.2212, -3.4579) centre (-30.2753, -0.4391) ccw
  line L1 (-38.2212, -3.4579) -> (-34.7788, -12.5188)
  arc A8 (-34.7788, -12.5188) -> (-26.8329, -18) centre (-26.8329, -9.5) ccw
  line L2 (-26.8329, -18) -> (-7.4558, -18)
  arc A9 (-7.4558, -18) -> (5.6256, -12.5815) centre (-7.4558, 0.5) ccw
  line L3 (5.6256, -12.5815) -> (12.5815, -5.6256)
  arc A10 (12.5815, -5.6256) -> (18, 7.4558) centre (-0.5, 7.4558) ccw
  line L4 (18, 7.4558) -> (18, 105)
  arc A11 (18, 105) -> (9.5, 113.5) centre (9.5, 105) ccw
  arc A12 (-15, 113.5) -> (-23.5, 105) centre (-15, 105) ccw
  line L5 (-23.5, 105) -> (-23.5, 86.3425)
  arc A13 (-23.5, 86.3425) -> (-23.2953, 83.5982) centre (-5, 86.3425) ccw
  line L6 (-23.2953, 83.5982) -> (-20.7379, 66.5485)
  arc A14 (-20.5, 63.3592) -> (-20.7379, 66.5485) centre (-42, 63.3592) ccw
  line L7 (-20.5, 63.3592) -> (-20.5, 29.4562)
  arc A15 (-30.9383, 11.0201) -> (-20.5, 29.4562) centre (-42, 29.4562) ccw
  line L8 (-30.9383, 11.0201) -> (-33.2596, 9.6273)
  line L9 (19.5, 7.4558) -> (19.5, 105)
  line L10 (9.5, 115) -> (-15, 115)
  dimension "d22" = 6
  dimension "d23" = 8
  dimension "d42" = 17.42
  dimension "d43" = 72.964
extrude "Extrude5" add sketch "Sketch5" along normal blind 6.8 contours A5
extrude "Extrude6" cut 1 faces at (-1.2923, 2, 40.6272) along direction (0, -1, 0) blind 5
sketch "Sketch6" plane through (0, 8.8, 0) normal (0, 1, 0) x (-1, 0, 0)
  circle A0 centre (2.08, 42.036) radius 3
  circle A1 centre (2.08, 42.036) radius 4
  circle A2 centre (2.08, 42.036) radius 4
extrude "Extrude7" add sketch "Sketch6" against normal blind 1 contours A0 | A1 A2
sketch "Sketch7" plane through (0, 8.8, 0) normal (0, 1, 0) x (-1, 0, 0)
  circle A0 centre (2.08, 42.036) radius 4
  circle A1 centre (2.08, 42.036) radius 1.5
  dimension "d31" = 3
extrude "Extrude8" cut sketch "Sketch7" against normal blind 5 contours A1
fillet "Fillet1" radius 2 20 edges at (23.5, 0, 74.8508) (22.0554, 0, 64.8467) (22, 0, 46.4077) (24.596, 0, 19.6022) (32.8707, 0, 11.6099) (36.2236, 0, 9.1331) (38.5251, 0, 5.4219) (40.2626, 0, 0.0635) (37.9022, 0, -8.521) (32.5112, 0, -17.7315) (17.1444, 0, -19.5) (-0.1978, 0, -17.9776) (-10.1642, 0, -10.1642) (-17.9776, 0, -0.1978) (-19.5, 0, 56.2279) (-16.5711, 0, 112.0711) (2.75, 0, 115) (22.0711, 0, 112.0711) (25, 0, 95.6712) (24.9446, 0, 84.855)
